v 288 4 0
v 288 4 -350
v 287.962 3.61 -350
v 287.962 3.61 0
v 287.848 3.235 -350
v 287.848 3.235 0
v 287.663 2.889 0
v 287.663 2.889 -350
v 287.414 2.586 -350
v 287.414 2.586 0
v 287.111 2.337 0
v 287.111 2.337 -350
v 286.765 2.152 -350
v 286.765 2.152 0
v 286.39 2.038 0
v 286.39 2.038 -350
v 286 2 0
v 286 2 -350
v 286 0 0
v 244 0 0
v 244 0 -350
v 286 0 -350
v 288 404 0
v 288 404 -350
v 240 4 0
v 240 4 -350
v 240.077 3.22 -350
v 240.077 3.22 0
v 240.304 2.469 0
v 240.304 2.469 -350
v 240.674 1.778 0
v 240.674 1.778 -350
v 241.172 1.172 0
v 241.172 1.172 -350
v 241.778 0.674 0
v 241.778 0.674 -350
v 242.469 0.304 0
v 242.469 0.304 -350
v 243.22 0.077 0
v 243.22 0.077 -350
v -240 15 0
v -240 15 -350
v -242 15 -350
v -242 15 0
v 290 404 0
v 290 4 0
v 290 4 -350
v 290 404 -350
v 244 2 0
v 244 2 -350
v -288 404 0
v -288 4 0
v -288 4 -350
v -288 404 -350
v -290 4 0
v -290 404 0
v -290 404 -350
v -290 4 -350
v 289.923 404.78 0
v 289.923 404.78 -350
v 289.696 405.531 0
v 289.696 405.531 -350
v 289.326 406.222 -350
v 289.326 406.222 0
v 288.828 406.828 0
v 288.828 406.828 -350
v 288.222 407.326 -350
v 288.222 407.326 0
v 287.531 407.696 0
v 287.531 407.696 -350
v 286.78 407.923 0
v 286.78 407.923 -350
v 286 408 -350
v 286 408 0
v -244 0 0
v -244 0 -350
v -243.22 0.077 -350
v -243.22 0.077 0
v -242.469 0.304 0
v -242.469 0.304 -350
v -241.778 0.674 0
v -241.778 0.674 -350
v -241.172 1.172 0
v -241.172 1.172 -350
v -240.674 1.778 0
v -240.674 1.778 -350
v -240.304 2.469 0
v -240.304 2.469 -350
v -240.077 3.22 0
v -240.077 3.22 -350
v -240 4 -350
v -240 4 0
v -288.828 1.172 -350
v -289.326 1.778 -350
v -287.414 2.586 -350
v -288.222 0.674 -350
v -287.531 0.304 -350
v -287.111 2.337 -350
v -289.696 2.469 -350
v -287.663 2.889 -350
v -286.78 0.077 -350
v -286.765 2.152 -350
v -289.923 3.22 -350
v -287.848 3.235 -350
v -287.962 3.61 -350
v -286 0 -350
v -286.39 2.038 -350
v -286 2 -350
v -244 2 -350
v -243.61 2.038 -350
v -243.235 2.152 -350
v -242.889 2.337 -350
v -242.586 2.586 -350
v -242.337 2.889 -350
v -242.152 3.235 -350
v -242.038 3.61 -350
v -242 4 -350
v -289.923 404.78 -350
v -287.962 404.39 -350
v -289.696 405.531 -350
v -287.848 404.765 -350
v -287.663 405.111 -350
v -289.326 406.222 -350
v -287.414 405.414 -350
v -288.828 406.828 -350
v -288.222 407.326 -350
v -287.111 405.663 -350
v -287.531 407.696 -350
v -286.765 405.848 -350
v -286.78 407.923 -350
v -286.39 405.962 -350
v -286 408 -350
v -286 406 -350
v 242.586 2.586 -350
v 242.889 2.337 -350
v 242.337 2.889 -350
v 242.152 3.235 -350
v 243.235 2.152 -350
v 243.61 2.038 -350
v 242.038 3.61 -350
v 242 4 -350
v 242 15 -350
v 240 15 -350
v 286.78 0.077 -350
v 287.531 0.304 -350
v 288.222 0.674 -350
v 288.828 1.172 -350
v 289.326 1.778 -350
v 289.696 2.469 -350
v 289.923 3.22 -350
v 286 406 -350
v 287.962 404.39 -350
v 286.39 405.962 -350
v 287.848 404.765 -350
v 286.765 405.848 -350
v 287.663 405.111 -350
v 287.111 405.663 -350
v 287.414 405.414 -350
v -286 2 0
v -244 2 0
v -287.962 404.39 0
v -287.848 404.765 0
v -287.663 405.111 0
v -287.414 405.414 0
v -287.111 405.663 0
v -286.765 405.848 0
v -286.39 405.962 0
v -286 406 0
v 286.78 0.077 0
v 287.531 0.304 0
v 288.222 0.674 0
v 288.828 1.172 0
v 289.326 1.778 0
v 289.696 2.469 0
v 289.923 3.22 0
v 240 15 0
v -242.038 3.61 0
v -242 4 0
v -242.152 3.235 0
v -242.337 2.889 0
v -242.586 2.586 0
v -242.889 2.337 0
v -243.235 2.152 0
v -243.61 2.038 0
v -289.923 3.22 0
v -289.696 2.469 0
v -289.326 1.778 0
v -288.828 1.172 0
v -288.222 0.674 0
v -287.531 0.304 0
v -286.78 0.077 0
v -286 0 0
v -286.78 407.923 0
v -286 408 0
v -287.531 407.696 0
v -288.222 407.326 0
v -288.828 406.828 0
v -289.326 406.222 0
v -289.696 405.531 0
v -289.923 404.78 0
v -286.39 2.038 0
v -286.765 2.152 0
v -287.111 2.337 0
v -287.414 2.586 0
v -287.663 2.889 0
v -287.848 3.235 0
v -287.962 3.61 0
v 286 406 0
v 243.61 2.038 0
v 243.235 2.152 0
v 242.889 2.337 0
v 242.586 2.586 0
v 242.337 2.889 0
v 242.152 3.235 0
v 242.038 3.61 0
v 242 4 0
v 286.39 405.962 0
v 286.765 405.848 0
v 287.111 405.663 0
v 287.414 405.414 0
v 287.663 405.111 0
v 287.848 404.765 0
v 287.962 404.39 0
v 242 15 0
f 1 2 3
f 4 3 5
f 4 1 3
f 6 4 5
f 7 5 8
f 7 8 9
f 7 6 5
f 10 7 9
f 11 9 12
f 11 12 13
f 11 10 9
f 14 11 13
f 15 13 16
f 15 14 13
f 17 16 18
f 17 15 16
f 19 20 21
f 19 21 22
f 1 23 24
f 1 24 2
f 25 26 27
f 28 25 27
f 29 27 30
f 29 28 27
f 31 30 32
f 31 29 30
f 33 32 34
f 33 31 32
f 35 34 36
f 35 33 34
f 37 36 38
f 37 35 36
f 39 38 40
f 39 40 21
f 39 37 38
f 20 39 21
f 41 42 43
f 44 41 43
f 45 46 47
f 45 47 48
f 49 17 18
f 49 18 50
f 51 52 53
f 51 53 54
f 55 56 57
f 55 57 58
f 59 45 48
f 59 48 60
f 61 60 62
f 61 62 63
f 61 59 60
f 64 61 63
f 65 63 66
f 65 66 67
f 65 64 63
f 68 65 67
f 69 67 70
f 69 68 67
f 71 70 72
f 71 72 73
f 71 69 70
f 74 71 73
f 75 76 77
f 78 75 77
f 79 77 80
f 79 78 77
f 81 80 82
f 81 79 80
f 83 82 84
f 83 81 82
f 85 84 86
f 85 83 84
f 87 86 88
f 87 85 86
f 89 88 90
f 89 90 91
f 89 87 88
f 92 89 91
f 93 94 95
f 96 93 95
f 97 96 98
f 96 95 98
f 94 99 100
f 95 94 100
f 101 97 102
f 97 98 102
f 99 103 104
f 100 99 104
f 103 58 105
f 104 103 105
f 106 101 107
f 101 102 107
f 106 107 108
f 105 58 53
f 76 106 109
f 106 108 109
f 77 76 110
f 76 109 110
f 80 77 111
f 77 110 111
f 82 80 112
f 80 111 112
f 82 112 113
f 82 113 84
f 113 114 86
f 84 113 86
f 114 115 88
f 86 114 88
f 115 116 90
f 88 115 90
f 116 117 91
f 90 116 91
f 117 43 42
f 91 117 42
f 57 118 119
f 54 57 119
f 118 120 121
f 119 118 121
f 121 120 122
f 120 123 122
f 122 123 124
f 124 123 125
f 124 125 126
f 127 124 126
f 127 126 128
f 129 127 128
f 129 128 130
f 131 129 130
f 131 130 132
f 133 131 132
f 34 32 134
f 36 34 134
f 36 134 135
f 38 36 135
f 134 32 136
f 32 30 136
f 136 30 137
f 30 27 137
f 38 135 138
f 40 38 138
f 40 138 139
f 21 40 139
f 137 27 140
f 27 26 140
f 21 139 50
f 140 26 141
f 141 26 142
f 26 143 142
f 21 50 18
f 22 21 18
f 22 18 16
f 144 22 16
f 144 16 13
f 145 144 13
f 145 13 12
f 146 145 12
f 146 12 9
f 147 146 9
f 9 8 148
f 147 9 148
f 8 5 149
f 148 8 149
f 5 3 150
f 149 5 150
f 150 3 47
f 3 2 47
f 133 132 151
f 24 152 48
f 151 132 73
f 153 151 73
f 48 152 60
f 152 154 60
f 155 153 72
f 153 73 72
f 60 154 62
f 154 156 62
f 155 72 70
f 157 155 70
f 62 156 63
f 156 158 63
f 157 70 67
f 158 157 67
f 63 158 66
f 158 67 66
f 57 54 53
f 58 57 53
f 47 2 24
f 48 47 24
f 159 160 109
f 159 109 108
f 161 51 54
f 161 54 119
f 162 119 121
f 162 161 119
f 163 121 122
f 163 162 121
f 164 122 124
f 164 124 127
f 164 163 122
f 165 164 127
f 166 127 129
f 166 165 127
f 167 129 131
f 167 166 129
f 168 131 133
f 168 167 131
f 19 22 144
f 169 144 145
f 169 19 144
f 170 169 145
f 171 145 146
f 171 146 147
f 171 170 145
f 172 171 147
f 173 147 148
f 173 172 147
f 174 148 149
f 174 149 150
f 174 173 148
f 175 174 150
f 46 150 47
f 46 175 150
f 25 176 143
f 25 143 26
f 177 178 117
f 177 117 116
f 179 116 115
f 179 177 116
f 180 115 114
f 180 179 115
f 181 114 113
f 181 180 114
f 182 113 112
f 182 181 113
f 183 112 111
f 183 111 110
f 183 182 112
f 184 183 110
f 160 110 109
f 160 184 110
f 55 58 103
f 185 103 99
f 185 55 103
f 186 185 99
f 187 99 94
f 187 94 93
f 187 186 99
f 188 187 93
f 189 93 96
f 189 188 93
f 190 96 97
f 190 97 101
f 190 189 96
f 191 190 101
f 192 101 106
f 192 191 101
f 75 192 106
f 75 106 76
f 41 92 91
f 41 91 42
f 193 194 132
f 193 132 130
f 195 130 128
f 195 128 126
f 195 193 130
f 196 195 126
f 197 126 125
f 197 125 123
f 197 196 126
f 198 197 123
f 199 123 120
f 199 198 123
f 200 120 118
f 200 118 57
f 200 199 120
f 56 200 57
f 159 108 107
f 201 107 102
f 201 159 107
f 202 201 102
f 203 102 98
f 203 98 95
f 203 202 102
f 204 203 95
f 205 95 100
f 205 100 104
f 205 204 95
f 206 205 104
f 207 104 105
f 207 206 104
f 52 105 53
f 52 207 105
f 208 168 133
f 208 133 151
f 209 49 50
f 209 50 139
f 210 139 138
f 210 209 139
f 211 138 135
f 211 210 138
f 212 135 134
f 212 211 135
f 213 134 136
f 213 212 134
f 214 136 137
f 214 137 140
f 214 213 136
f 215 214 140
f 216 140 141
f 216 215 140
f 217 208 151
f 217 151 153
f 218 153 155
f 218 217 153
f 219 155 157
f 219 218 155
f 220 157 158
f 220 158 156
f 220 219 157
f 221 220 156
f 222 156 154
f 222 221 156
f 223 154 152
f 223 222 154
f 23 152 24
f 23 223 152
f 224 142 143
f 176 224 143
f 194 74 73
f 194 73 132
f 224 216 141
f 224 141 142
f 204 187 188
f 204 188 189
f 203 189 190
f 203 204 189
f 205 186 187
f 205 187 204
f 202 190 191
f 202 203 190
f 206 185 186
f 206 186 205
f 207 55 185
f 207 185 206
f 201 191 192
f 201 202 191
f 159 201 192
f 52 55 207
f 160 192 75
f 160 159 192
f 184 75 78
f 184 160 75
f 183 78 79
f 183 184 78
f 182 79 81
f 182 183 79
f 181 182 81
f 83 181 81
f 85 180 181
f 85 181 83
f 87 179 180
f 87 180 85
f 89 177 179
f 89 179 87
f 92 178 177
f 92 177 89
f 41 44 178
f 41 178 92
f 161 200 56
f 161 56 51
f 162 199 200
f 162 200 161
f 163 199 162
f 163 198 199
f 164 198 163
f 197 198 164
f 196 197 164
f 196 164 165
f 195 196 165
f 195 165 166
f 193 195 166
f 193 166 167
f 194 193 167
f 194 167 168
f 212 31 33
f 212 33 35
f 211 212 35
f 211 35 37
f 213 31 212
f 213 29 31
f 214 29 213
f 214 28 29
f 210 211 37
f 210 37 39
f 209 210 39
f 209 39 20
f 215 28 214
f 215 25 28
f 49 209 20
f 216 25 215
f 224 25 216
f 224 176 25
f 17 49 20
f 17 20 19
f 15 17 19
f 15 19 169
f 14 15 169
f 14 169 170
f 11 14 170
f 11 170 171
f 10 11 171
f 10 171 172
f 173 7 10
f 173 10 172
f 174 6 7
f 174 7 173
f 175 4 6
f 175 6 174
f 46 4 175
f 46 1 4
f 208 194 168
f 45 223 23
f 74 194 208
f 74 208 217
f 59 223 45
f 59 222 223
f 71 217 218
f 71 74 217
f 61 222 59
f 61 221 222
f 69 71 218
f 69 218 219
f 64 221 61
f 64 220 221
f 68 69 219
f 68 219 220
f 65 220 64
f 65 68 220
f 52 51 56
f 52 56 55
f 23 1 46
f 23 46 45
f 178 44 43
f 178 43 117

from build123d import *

# Parameters (mm, degrees)
F1_DEPTH = 350


with BuildPart() as f1:
    # F0 (on Top) → F1 (new body)
    with BuildSketch(Plane.XY):
        with BuildLine():
            ThreePointArc((-290, 4), (-288.828427, 1.171573), (-286, 0))
            Line((-286, 0), (-244, 0))
            ThreePointArc((-244, 0), (-241.171573, 1.171573), (-240, 4))
            Line((-240, 4), (-240, 15))
            Line((-240, 15), (-242, 15))
            Line((-242, 15), (-242, 4))
            ThreePointArc((-242, 4), (-242.585786, 2.585786), (-244, 2))
            Line((-244, 2), (-286, 2))
            ThreePointArc((-286, 2), (-287.414214, 2.585786), (-288, 4))
            Line((-288, 4), (-288, 404))
            ThreePointArc((-288, 404), (-287.414214, 405.414214), (-286, 406))
            Line((-286, 406), (286, 406))
            ThreePointArc((286, 406), (287.414214, 405.414214), (288, 404))
            Line((288, 404), (288, 4))
            ThreePointArc((288, 4), (287.414214, 2.585786), (286, 2))
            Line((286, 2), (244, 2))
            ThreePointArc((244, 2), (242.585786, 2.585786), (242, 4))
            Line((242, 4), (242, 15))
            Line((242, 15), (240, 15))
            Line((240, 15), (240, 4))
            ThreePointArc((240, 4), (241.171573, 1.171573), (244, 0))
            Line((244, 0), (286, 0))
            ThreePointArc((286, 0), (288.828427, 1.171573), (290, 4))
            Line((290, 4), (290, 404))
            ThreePointArc((290, 404), (288.828427, 406.828427), (286, 408))
            Line((286, 408), (-286, 408))
            ThreePointArc((-286, 408), (-288.828427, 406.828427), (-290, 404))
            Line((-290, 404), (-290, 4))
        make_face()
    extrude(amount=-F1_DEPTH)


solid = f1.part
